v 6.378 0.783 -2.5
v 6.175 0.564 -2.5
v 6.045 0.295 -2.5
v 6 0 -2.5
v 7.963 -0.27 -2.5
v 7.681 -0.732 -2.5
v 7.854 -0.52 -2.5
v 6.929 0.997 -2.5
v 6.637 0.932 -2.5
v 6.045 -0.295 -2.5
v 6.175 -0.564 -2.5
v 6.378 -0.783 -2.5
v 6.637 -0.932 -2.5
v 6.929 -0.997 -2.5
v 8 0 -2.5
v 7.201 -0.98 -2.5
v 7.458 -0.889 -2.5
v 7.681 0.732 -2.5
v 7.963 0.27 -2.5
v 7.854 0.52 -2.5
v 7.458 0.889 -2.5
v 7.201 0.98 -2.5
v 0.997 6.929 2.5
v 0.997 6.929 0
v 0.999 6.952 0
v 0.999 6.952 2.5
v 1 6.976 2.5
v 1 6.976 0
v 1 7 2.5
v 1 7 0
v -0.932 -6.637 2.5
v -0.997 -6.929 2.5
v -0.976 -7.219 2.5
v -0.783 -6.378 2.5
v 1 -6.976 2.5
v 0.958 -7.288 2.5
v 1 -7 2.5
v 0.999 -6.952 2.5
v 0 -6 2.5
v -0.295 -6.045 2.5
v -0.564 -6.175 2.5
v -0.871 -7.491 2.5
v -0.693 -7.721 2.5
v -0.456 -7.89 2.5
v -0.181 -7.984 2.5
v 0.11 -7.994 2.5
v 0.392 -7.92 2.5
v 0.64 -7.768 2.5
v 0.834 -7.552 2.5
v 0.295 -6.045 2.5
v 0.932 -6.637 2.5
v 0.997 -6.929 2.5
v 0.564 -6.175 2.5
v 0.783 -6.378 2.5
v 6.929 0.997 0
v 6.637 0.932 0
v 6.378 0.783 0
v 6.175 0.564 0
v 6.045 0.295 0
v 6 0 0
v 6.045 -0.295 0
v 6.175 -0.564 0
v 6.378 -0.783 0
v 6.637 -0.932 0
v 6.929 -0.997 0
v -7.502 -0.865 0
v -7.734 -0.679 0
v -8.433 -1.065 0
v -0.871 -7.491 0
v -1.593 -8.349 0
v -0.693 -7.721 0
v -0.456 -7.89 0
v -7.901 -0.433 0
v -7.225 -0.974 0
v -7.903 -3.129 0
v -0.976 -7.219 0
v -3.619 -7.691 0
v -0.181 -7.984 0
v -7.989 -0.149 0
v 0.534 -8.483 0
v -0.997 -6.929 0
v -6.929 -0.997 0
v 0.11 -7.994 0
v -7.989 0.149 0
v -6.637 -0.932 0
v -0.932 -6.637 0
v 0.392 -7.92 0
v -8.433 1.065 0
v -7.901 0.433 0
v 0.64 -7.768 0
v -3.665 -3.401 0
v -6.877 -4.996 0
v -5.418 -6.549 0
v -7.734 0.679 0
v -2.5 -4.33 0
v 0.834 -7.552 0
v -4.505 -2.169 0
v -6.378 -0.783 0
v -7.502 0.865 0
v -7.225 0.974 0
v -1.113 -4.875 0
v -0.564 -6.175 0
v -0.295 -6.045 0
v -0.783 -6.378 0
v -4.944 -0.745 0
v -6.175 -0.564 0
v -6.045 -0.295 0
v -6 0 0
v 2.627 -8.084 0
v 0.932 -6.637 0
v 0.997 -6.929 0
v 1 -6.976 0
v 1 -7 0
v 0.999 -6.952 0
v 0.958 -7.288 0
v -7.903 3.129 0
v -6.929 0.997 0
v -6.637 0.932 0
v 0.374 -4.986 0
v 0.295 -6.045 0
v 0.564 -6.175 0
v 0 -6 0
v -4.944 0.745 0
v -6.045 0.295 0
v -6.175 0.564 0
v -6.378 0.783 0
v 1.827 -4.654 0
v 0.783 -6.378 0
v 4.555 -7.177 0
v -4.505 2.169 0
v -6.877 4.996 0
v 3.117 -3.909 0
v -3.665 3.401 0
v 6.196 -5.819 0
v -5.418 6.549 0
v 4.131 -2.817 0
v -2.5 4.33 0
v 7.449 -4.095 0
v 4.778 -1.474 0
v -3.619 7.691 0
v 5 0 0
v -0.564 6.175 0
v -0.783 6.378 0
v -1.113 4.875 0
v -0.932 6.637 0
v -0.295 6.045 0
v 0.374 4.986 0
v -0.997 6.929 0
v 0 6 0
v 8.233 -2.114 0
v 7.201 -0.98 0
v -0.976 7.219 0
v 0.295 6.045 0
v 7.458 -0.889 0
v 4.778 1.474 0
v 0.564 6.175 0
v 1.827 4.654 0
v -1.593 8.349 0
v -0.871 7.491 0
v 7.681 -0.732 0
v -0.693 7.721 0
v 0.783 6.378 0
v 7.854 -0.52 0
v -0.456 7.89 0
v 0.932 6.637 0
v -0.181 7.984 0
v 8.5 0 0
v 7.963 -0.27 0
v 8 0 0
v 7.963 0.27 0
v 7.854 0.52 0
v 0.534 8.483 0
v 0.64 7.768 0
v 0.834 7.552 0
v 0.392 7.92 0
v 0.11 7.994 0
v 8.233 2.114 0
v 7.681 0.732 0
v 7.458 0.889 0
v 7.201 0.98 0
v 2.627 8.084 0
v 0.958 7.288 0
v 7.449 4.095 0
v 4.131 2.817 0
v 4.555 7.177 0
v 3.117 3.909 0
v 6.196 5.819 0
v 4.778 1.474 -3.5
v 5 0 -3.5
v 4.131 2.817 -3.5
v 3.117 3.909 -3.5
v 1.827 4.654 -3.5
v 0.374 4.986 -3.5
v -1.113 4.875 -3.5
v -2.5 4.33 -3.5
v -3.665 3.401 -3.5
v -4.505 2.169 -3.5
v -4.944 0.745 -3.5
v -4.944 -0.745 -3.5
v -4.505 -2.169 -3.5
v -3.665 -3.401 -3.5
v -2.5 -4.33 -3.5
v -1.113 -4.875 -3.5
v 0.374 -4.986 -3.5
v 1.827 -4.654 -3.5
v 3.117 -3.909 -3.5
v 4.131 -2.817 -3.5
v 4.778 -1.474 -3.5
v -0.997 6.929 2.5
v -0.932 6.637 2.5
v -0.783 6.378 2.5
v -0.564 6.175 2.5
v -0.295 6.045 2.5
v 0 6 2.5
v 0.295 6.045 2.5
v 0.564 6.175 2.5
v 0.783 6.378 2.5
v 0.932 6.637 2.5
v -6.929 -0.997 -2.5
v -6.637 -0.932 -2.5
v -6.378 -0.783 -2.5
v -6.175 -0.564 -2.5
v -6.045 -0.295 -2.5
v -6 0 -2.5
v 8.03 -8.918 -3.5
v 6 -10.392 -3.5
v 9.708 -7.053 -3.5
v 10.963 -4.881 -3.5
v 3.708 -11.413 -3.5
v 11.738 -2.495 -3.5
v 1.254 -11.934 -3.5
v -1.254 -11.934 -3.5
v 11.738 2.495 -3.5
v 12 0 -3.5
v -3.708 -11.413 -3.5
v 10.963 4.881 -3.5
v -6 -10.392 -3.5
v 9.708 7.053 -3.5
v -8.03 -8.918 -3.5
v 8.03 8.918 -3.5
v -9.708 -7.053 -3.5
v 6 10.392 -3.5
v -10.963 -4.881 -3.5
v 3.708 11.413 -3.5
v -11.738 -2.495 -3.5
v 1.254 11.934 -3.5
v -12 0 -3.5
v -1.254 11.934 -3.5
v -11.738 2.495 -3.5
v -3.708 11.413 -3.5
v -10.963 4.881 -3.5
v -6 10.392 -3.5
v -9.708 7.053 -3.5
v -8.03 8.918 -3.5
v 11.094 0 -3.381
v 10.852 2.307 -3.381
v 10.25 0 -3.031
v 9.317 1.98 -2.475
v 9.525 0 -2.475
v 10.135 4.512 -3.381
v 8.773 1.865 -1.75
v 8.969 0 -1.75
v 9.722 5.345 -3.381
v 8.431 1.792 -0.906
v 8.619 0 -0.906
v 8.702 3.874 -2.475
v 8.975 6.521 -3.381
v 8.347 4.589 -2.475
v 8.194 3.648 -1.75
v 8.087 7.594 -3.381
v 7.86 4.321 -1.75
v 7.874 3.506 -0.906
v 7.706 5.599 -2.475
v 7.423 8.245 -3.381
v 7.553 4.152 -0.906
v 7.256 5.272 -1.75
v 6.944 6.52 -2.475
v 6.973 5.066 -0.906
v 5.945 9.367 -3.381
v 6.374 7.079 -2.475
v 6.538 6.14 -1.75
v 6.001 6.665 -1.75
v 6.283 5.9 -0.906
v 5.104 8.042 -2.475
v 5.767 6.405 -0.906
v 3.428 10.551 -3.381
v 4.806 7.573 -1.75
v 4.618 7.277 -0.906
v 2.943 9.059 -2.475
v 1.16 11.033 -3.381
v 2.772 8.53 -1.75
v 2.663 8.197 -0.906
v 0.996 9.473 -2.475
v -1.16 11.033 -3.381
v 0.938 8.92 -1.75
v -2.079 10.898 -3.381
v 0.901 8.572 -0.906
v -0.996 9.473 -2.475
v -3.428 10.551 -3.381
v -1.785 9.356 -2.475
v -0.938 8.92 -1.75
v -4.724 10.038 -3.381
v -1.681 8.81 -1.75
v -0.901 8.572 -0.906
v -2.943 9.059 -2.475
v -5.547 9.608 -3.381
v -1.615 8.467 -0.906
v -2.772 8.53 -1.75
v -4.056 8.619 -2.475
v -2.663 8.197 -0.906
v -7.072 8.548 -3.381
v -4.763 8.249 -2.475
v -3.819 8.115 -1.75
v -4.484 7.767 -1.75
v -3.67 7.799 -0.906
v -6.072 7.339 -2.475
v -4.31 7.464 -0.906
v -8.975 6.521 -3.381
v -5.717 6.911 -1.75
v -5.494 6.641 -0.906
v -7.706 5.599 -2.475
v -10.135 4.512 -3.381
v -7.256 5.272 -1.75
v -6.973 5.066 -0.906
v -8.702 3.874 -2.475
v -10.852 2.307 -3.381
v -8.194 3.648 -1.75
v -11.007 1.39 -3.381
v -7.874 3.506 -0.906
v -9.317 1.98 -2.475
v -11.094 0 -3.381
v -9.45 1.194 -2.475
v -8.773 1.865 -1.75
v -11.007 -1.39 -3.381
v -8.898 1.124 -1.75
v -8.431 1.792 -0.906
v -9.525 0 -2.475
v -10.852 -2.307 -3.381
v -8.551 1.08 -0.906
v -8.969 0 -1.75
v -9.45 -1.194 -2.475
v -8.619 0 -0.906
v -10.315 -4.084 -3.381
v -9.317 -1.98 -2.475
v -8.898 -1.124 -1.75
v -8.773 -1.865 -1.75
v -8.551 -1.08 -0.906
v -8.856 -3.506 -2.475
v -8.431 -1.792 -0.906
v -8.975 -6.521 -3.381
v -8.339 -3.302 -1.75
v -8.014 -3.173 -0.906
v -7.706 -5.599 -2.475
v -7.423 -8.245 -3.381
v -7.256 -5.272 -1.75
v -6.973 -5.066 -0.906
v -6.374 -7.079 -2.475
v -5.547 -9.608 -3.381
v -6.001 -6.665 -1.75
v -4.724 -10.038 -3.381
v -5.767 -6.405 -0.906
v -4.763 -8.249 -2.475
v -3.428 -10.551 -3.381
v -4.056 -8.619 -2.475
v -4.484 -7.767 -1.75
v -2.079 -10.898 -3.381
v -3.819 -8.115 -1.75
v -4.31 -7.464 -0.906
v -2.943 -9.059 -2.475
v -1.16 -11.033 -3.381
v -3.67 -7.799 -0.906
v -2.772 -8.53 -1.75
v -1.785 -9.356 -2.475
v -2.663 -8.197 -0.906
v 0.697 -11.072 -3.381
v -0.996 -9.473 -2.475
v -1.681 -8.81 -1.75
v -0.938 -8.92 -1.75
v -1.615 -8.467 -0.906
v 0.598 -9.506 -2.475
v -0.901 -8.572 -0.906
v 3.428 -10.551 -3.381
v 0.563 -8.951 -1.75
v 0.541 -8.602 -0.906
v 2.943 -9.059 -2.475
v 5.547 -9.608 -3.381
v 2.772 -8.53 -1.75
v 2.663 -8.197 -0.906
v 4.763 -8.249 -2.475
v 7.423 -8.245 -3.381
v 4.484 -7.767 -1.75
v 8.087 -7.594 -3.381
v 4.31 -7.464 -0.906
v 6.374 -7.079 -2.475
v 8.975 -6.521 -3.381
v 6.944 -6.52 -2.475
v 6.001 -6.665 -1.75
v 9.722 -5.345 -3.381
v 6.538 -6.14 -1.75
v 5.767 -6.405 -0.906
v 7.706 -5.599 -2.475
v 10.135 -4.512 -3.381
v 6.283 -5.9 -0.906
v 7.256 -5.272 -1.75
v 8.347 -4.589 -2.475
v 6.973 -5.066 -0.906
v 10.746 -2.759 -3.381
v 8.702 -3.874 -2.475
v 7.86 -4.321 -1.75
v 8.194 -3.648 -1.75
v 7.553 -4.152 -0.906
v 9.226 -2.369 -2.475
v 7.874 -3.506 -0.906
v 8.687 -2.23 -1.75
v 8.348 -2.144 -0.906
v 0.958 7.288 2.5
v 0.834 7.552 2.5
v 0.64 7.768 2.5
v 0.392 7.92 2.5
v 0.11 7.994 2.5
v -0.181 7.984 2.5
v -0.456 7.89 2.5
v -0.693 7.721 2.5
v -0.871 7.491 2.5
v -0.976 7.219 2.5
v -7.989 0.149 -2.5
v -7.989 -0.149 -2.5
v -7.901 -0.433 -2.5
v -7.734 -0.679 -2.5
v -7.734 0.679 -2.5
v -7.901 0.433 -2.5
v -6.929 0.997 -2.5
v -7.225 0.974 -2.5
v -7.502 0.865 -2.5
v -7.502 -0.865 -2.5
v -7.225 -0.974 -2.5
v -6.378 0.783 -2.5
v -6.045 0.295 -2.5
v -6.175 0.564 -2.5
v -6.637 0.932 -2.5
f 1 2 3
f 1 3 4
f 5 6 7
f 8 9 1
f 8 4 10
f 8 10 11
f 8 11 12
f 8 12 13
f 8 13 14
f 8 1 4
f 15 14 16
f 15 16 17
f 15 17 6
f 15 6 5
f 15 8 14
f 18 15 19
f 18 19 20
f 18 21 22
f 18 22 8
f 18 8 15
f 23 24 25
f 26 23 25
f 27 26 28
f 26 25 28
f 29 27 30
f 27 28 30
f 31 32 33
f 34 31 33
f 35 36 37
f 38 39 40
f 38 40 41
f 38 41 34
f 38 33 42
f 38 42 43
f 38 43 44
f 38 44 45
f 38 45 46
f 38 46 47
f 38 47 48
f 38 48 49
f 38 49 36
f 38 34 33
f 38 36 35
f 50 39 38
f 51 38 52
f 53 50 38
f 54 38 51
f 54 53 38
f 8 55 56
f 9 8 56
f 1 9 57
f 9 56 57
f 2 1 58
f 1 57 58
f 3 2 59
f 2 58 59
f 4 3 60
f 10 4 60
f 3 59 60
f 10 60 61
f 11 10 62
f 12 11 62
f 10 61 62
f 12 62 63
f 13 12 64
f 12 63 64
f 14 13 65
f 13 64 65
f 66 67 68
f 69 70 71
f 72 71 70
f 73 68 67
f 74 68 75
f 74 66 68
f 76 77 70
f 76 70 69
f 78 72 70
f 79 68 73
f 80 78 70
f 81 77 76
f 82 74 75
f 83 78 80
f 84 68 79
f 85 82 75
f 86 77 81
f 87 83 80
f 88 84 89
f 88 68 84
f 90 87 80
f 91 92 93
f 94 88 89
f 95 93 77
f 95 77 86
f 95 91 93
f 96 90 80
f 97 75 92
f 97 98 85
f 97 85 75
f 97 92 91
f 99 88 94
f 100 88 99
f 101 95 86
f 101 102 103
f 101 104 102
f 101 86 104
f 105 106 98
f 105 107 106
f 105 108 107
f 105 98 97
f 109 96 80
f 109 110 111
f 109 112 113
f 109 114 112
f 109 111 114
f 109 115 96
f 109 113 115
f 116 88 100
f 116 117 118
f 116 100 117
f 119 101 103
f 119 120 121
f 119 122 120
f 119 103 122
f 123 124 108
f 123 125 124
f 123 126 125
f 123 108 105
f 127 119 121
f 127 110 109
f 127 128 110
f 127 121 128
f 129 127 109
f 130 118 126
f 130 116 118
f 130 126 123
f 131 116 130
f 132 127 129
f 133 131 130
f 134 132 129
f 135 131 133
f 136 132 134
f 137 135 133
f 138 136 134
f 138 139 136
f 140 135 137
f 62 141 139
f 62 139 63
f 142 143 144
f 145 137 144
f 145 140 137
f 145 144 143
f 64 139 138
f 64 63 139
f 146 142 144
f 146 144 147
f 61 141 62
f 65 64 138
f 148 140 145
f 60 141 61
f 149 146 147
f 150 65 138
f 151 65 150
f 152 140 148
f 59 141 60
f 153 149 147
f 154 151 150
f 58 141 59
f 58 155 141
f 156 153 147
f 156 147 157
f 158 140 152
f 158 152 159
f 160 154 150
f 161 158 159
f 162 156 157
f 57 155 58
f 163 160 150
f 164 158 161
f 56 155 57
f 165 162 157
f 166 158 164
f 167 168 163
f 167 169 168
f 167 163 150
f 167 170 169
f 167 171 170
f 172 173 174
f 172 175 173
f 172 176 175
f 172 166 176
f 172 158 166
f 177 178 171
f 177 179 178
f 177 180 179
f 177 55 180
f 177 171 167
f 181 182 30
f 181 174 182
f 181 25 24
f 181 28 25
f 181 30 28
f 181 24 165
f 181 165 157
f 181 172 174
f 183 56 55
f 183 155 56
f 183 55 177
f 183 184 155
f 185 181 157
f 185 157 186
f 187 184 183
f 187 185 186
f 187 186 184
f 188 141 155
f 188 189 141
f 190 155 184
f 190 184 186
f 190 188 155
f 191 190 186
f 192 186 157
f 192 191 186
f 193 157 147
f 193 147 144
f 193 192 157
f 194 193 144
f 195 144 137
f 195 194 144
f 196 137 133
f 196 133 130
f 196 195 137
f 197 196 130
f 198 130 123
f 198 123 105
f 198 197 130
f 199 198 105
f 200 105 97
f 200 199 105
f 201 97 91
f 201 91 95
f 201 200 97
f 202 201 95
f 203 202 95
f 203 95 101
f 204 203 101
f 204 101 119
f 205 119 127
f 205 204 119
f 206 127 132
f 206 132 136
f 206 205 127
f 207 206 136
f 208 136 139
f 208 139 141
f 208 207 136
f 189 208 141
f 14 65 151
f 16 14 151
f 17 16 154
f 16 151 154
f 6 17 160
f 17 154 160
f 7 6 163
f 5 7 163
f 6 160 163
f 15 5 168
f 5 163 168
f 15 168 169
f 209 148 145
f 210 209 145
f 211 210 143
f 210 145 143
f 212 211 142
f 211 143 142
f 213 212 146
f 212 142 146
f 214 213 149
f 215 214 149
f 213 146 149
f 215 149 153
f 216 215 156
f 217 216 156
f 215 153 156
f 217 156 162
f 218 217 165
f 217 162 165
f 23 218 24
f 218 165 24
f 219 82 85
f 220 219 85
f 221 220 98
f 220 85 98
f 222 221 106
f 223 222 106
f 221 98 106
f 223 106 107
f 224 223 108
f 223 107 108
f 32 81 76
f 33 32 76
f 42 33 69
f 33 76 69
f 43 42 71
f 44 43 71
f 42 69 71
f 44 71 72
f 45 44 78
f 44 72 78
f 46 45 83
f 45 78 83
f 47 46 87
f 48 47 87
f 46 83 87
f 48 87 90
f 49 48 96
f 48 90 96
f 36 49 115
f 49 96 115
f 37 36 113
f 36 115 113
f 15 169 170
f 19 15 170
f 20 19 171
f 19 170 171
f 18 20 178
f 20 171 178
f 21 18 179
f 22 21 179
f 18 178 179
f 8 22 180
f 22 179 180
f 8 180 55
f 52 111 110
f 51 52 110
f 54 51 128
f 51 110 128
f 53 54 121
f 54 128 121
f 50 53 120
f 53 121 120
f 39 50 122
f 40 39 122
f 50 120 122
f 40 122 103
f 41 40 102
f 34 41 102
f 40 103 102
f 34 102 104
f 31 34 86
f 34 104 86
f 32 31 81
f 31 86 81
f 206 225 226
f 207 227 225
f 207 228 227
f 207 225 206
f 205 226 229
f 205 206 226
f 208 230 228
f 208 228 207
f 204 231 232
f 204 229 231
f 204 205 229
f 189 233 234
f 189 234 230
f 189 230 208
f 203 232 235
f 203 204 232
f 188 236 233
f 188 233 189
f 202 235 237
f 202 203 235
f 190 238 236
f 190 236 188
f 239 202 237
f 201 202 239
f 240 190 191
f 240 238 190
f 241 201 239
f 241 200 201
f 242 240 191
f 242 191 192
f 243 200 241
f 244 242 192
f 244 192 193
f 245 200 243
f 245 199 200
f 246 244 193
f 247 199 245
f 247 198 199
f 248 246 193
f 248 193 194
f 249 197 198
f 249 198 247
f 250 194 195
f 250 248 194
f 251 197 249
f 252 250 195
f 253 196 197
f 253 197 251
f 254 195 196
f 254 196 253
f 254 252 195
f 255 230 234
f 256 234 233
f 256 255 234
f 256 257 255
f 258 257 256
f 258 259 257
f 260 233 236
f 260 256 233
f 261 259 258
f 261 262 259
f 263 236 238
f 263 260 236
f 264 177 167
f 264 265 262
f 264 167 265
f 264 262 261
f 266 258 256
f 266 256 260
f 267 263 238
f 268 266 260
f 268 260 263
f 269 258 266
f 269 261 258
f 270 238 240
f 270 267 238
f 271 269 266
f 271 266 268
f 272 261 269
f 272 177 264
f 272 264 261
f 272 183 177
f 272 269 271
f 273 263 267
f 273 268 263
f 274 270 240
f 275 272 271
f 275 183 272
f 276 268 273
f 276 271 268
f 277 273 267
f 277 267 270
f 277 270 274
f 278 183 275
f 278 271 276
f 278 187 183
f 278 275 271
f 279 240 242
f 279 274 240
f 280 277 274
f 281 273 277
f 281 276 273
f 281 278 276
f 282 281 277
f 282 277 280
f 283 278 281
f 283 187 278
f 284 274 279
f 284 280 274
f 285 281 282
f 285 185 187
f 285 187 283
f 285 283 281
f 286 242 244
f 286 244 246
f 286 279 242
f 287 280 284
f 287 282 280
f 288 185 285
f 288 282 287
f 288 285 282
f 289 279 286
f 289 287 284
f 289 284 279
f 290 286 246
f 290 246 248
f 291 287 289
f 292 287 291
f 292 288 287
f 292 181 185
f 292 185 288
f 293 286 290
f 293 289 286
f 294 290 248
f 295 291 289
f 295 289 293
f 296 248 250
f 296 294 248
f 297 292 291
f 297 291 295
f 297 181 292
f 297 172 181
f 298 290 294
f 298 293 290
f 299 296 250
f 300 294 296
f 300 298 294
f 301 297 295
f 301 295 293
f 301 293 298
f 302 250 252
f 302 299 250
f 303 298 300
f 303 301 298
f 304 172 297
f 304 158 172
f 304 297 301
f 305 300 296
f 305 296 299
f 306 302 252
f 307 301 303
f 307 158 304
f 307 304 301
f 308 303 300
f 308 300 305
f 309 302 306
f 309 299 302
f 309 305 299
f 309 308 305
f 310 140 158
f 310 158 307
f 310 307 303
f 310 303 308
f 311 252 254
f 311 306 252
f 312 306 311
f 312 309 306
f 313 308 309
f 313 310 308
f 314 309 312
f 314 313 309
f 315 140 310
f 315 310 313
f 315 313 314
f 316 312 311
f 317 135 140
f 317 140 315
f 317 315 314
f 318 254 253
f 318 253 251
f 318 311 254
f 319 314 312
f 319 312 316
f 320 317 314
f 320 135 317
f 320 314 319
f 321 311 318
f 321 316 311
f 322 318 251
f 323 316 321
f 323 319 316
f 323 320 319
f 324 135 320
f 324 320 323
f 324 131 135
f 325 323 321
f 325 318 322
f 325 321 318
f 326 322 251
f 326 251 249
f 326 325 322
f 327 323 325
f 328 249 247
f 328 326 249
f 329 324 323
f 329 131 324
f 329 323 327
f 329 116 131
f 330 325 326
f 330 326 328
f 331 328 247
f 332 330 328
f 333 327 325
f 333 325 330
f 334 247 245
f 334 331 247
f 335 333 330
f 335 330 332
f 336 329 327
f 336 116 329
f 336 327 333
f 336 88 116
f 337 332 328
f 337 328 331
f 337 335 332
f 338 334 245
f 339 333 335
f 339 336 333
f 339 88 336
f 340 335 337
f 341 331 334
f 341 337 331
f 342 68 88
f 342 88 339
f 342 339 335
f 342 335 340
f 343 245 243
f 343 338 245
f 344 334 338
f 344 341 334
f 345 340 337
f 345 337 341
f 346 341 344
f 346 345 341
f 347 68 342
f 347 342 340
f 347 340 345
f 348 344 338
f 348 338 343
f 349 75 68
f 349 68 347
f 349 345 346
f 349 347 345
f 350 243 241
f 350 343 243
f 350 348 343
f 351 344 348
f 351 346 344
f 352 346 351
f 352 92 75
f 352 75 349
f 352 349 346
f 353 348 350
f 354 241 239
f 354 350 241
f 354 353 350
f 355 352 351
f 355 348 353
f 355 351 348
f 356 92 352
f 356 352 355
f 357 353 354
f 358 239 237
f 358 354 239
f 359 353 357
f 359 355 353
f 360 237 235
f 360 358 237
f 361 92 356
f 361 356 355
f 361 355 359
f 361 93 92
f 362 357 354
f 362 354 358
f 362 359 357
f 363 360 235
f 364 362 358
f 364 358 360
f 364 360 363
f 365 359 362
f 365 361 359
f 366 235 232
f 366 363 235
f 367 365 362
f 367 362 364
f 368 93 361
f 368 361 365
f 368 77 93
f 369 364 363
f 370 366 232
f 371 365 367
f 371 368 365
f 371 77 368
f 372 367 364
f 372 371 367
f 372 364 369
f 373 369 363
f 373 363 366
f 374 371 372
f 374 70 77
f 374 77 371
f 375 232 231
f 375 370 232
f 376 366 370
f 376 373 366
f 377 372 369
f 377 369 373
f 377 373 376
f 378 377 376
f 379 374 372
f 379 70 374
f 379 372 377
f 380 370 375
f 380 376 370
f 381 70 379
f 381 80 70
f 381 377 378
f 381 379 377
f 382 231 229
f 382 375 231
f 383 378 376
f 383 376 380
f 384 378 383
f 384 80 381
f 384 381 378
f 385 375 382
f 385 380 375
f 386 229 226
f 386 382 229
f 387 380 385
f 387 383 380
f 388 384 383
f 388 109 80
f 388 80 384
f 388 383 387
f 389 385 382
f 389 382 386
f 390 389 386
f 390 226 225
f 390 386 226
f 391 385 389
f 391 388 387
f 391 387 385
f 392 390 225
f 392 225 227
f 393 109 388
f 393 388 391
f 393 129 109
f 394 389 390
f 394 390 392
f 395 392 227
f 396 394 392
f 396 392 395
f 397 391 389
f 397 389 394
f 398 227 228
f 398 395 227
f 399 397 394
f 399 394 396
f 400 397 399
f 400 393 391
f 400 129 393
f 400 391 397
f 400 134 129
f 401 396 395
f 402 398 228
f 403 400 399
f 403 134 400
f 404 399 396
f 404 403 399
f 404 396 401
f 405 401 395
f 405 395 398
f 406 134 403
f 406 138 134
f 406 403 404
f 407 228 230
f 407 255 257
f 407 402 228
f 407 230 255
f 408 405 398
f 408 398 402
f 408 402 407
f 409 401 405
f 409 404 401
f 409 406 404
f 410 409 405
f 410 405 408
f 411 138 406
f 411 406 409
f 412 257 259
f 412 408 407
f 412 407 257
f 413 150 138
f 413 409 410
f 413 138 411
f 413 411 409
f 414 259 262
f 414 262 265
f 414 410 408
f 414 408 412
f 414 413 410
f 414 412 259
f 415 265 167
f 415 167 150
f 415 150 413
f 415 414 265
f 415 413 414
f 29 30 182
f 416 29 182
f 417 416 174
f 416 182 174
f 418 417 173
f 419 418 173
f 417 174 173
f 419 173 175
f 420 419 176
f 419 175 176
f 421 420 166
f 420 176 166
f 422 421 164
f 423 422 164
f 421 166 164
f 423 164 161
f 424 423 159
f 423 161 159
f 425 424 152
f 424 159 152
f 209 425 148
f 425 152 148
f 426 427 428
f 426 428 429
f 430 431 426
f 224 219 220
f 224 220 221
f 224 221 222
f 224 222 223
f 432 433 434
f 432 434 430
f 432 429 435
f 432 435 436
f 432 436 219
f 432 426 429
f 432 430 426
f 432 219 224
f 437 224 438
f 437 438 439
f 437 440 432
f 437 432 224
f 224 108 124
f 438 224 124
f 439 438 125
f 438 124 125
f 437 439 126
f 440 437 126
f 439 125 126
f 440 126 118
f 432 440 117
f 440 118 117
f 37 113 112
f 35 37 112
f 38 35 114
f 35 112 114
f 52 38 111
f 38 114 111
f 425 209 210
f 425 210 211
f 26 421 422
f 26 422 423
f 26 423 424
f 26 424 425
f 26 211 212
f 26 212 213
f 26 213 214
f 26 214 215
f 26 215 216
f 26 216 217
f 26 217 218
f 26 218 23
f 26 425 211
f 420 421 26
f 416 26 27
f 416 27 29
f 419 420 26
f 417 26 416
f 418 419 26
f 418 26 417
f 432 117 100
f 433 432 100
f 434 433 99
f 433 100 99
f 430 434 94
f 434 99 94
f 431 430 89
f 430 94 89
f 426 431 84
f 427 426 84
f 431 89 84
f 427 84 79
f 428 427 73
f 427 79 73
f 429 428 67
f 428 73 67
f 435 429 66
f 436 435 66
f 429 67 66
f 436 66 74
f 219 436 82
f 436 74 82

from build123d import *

# Parameters (mm, degrees)
F3_DEPTH = 2.5
F4_DEPTH = 5


with BuildPart() as f1:
    # F0 (on Front) → F1 (revolve)
    with BuildSketch(Plane.XZ):
        with BuildLine():
            Line((8.5, 0), (5, 0))
            Line((5, 0), (5, -3.5))
            Line((5, -3.5), (12, -3.5))
            ThreePointArc((12, -3.5), (9.5251262658, -2.4748737342), (8.5, 0))
        make_face()
    revolve(axis=Axis((0, 0, 10.7058882713), (0, 0, 1)))

    # F2 (on face) → F3 (cut)
    with BuildSketch(Plane.XY):
        with BuildLine():
            ThreePointArc((1, 7), (-0.0357371137, 7.9993612253), (-0.9974457174, 6.9285714286))
            ThreePointArc((-0.9974457174, 6.9285714286), (0, 6), (0.9974457174, 6.9285714286))
            ThreePointArc((0.9974457174, 6.9285714286), (0.9993612253, 6.9642628863), (1, 7))
        make_face()
        with BuildLine():
            ThreePointArc((-6, 0), (-6.2680749453, 0.6813851439), (-6.9285714286, 0.9974457174))
            ThreePointArc((-6.9285714286, 0.9974457174), (-8, 0), (-6.9285714286, -0.9974457174))
            ThreePointArc((-6.9285714286, -0.9974457174), (-6.2680749453, -0.6813851439), (-6, 0))
        make_face()
        with BuildLine():
            ThreePointArc((0.9974457174, -6.9285714286), (0, -6), (-0.9974457174, -6.9285714286))
            ThreePointArc((-0.9974457174, -6.9285714286), (-0.0357371137, -7.9993612253), (1, -7))
            ThreePointArc((1, -7), (0.9993612253, -6.9642628863), (0.9974457174, -6.9285714286))
        make_face()
        with BuildLine():
            ThreePointArc((8, 0), (7.6813851439, 0.7319250547), (6.9285714286, 0.9974457174))
            ThreePointArc((6.9285714286, 0.9974457174), (6, 0), (6.9285714286, -0.9974457174))
            ThreePointArc((6.9285714286, -0.9974457174), (7.6813851439, -0.7319250547), (8, 0))
        make_face()
    extrude(amount=-F3_DEPTH, mode=Mode.SUBTRACT)

    # F4 (add): faces of the model
    f4_faces = [f1.faces().sort_by_distance(p)[0] for p in [
        (0, 7, -2.5),
        (0, -7, -2.5),
    ]]
    extrude(f4_faces, amount=F4_DEPTH)


solid = f1.part
